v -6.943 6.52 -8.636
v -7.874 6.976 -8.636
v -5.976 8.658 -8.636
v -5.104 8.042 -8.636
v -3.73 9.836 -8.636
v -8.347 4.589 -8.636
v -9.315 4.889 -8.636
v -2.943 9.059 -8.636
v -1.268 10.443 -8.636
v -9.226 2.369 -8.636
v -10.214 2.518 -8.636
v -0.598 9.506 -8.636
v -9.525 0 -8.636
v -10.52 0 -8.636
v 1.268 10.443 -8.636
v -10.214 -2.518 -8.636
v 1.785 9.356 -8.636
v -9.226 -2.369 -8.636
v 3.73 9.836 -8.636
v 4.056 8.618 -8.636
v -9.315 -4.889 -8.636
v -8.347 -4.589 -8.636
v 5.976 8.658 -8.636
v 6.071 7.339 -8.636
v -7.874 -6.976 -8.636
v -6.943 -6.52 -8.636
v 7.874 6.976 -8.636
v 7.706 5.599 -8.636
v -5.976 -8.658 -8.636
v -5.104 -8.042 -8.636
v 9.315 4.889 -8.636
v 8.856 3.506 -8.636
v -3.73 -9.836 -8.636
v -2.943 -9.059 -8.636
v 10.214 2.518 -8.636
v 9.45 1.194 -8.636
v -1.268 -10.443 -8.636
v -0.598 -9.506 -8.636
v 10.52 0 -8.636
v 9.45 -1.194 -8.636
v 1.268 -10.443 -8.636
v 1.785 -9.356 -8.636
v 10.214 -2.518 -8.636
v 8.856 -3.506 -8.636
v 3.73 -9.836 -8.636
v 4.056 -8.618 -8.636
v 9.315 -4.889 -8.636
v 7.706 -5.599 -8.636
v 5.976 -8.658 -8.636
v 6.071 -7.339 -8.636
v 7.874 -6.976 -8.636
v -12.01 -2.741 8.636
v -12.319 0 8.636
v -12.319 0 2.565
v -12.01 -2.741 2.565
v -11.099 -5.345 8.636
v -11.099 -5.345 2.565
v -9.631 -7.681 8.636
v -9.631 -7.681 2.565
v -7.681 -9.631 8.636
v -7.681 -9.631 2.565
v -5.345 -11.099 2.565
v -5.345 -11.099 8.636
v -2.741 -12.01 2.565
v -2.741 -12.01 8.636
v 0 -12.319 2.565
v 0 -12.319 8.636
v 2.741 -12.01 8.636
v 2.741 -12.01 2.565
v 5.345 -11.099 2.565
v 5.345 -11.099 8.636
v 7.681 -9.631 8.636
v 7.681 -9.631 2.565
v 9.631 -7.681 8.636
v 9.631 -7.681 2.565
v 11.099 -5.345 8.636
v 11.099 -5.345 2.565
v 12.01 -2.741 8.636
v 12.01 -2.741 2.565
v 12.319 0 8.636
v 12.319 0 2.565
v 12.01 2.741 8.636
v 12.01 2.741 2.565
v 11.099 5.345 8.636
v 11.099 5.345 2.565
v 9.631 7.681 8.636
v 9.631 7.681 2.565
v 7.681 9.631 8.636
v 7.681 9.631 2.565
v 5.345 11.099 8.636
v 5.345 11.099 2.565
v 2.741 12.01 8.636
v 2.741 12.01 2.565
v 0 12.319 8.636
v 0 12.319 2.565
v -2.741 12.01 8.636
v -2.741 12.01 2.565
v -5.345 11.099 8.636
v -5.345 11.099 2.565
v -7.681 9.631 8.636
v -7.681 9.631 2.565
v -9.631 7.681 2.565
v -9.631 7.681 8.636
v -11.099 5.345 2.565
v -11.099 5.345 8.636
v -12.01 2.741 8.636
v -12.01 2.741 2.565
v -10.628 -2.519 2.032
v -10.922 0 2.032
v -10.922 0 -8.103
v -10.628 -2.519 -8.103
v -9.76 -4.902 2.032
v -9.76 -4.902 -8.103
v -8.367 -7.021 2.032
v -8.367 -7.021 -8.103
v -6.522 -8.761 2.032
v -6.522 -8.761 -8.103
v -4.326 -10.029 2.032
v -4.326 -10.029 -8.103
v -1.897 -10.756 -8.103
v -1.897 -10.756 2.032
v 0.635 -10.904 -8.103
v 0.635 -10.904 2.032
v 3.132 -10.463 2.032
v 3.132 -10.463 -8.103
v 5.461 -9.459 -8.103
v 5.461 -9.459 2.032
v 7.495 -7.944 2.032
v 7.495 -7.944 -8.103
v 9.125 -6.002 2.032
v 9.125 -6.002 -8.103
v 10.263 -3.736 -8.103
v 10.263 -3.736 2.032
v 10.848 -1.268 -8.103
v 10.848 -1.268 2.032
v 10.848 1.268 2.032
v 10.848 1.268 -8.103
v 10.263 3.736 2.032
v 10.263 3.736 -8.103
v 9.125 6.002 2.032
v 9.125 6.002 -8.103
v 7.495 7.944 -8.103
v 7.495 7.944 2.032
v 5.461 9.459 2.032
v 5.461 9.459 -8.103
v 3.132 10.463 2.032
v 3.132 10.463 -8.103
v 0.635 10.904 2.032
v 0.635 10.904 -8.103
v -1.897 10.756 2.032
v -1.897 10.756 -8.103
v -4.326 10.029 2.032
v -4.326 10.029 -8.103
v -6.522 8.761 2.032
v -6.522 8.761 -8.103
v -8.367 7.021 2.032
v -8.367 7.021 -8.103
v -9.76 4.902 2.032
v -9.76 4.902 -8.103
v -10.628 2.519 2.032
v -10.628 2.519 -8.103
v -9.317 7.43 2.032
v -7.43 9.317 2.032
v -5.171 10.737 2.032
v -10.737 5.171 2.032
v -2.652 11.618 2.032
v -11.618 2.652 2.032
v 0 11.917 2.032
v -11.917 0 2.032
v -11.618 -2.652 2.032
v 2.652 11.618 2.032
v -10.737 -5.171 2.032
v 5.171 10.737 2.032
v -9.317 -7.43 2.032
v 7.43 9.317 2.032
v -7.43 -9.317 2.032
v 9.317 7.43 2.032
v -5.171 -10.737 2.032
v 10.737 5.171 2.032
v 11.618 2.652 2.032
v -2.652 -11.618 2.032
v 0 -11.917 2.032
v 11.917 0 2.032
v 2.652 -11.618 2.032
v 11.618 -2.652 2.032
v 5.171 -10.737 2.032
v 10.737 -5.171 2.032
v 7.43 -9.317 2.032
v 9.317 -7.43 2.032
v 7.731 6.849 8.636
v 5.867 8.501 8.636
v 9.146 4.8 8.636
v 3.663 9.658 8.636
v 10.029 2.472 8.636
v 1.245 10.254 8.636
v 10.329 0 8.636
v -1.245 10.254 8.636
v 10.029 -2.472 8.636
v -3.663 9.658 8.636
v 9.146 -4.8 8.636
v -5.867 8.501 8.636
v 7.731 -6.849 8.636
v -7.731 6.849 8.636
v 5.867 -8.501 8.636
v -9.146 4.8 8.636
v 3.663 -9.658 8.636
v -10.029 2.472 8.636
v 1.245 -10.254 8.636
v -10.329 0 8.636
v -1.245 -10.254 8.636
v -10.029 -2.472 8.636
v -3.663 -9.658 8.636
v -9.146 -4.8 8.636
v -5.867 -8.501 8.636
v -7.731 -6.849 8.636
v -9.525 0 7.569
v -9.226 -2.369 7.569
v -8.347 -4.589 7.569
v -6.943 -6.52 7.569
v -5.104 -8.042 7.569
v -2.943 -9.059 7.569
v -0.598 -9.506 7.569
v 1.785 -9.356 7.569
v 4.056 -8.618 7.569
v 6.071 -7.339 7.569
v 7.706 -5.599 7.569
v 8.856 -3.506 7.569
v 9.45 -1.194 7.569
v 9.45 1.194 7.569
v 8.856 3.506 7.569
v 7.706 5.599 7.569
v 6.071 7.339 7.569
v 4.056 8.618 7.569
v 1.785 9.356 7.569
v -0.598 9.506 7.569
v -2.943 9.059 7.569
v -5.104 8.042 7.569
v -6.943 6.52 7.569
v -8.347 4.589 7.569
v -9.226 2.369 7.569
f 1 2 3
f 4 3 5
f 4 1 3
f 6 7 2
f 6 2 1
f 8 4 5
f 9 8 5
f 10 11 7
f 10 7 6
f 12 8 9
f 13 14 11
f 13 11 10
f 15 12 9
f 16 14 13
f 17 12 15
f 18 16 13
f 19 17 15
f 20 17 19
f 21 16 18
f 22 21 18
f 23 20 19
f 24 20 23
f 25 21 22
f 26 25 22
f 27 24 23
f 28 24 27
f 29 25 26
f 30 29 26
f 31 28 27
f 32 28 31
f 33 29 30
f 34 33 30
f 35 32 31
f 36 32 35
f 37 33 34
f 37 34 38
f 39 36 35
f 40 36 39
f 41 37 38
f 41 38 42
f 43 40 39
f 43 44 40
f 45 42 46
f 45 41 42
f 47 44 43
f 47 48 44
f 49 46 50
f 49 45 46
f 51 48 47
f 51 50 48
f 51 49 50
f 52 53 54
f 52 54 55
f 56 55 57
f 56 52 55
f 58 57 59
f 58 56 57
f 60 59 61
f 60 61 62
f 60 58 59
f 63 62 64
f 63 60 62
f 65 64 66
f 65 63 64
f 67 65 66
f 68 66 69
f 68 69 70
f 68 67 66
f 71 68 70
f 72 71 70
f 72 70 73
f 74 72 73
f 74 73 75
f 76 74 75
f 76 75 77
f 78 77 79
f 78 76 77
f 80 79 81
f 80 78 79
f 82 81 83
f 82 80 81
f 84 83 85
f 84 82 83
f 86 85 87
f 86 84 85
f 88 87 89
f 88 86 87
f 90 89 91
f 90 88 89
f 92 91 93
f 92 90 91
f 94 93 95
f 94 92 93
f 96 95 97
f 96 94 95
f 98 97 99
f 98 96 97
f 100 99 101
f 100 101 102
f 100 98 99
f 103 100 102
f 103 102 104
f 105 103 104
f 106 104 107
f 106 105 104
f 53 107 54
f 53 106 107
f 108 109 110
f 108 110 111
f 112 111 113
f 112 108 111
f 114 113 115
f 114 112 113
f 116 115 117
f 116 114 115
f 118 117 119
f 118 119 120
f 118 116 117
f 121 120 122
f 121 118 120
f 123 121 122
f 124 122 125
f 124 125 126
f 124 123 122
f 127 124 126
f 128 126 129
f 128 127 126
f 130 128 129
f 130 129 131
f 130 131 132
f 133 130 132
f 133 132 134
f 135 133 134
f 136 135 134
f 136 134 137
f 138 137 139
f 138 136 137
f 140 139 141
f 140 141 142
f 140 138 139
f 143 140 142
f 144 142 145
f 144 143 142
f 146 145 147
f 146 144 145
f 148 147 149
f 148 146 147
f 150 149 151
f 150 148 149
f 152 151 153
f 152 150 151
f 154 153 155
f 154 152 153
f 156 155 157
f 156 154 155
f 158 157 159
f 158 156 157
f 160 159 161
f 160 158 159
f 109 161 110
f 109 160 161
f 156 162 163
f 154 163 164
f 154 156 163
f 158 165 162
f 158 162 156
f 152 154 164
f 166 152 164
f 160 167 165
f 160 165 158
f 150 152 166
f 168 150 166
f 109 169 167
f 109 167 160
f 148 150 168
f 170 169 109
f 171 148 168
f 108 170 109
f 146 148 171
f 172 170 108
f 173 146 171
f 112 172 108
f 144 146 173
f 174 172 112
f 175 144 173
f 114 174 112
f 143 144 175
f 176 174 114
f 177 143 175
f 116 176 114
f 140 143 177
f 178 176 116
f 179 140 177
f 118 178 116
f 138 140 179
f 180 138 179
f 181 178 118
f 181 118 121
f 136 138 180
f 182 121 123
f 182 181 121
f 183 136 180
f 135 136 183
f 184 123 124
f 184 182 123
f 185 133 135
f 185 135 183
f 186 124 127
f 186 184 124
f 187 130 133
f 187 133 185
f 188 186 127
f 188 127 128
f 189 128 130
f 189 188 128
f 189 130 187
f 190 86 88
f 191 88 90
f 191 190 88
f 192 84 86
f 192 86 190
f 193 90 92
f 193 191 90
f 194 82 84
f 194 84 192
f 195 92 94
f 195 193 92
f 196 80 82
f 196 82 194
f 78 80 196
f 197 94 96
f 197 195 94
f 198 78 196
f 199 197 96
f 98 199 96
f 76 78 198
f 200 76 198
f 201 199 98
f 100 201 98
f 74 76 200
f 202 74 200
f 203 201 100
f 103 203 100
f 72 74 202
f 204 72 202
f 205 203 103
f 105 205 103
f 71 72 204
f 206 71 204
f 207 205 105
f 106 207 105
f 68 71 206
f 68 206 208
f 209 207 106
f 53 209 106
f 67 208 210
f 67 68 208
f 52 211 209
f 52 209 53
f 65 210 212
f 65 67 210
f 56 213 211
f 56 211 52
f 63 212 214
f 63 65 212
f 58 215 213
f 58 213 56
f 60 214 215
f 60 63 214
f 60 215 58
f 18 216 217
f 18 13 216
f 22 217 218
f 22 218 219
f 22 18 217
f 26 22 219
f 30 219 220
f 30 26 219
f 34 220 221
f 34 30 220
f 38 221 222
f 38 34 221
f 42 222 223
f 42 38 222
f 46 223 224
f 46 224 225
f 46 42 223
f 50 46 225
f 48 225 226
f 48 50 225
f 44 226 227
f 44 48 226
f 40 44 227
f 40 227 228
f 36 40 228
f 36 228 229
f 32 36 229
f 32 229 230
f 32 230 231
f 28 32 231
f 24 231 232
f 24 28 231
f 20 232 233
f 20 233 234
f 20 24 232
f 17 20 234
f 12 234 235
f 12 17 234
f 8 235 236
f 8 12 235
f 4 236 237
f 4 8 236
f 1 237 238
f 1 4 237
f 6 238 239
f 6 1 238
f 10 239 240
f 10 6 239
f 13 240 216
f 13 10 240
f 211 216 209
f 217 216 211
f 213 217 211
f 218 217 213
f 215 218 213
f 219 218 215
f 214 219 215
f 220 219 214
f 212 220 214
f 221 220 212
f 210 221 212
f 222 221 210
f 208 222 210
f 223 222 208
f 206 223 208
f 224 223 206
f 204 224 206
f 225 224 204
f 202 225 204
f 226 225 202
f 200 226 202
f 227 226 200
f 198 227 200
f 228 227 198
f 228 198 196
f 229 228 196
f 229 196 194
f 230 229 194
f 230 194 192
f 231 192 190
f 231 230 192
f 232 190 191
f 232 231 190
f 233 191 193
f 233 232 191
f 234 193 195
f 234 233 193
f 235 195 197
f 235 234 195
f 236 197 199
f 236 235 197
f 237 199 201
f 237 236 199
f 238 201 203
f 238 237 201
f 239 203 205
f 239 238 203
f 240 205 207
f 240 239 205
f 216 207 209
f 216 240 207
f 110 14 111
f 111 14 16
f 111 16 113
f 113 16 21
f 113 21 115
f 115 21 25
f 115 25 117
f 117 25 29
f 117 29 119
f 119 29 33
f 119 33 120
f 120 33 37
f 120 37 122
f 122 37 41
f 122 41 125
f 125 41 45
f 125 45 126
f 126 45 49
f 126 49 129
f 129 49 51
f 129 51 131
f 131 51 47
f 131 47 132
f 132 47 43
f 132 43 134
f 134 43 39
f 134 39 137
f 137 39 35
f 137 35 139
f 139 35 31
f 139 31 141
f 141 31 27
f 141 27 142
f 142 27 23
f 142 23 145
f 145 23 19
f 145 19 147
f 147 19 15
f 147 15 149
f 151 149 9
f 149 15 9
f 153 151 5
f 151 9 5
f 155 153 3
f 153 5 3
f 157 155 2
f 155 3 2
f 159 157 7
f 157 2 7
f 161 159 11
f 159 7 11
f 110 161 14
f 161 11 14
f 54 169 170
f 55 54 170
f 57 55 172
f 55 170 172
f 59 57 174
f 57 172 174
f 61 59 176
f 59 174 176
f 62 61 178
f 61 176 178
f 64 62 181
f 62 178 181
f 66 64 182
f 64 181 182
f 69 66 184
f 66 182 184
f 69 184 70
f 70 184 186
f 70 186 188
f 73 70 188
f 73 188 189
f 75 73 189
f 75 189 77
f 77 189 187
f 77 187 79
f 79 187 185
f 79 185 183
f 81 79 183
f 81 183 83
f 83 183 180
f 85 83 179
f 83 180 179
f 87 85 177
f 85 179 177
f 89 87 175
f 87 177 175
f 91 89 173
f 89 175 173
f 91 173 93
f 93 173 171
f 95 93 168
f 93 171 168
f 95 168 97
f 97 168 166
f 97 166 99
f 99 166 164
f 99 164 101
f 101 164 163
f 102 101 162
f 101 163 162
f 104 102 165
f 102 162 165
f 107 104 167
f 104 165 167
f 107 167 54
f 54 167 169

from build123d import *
from OCP.BRepFilletAPI import BRepFilletAPI_MakeChamfer

# Parameters (mm, degrees)
CHAMFER2_SIZE  = 0.5334
CHAMFER2_SIZE2 = 0.40194573


with BuildPart() as part:
    # Sketch2 → Revolve1 (revolve)
    with BuildSketch(Plane(origin=(0, 0, 0), x_dir=(0, 0, -1), z_dir=(1, 0, 0)), mode=Mode.PRIVATE) as revolve1_sk:
        Polygon((8.636, 9.525), (8.636, 10.922), (-2.032, 10.922), (-2.032, 12.319), (-8.636, 12.319), (-8.636, 10.328891461), (-7.5692, 9.525), align=None)
    revolve(revolve1_sk.sketch.rotate(Axis((0, 0, -8.636), (0, 0, 1)), 90), axis=Axis((0, 0, -8.636), (0, 0, 1)))

    # Chamfer2: one chamfer whose edges measure the first distance from different faces: ONE call of the kernel's chamfer builder (chamfer() names one face for all edges)
    chamfer2_edges_1 = [part.edges().sort_by_distance(p)[0] for p in [
        (12.319, 0, 2.032),
    ]]
    chamfer2_side_1 = [part.faces().sort_by_distance(p)[0] for p in [
        (12.319, 0, 5.334),
    ]]
    chamfer2_edges_2 = [part.edges().sort_by_distance(p)[0] for p in [
        (10.922, 0, -8.636),
    ]]
    chamfer2_side_2 = [part.faces().sort_by_distance(p)[0] for p in [
        (10.922, 0, -3.302),
    ]]
    chamfer2 = BRepFilletAPI_MakeChamfer(part.part.solid().wrapped)
    for e in chamfer2_edges_1:
        chamfer2.Add(CHAMFER2_SIZE, CHAMFER2_SIZE2, e.wrapped, chamfer2_side_1[0].wrapped)  # the first distance lies on this face
    for e in chamfer2_edges_2:
        chamfer2.Add(CHAMFER2_SIZE, CHAMFER2_SIZE2, e.wrapped, chamfer2_side_2[0].wrapped)  # the first distance lies on this face
    add(Compound.cast(chamfer2.Shape()), mode=Mode.REPLACE)


solid = part.part
